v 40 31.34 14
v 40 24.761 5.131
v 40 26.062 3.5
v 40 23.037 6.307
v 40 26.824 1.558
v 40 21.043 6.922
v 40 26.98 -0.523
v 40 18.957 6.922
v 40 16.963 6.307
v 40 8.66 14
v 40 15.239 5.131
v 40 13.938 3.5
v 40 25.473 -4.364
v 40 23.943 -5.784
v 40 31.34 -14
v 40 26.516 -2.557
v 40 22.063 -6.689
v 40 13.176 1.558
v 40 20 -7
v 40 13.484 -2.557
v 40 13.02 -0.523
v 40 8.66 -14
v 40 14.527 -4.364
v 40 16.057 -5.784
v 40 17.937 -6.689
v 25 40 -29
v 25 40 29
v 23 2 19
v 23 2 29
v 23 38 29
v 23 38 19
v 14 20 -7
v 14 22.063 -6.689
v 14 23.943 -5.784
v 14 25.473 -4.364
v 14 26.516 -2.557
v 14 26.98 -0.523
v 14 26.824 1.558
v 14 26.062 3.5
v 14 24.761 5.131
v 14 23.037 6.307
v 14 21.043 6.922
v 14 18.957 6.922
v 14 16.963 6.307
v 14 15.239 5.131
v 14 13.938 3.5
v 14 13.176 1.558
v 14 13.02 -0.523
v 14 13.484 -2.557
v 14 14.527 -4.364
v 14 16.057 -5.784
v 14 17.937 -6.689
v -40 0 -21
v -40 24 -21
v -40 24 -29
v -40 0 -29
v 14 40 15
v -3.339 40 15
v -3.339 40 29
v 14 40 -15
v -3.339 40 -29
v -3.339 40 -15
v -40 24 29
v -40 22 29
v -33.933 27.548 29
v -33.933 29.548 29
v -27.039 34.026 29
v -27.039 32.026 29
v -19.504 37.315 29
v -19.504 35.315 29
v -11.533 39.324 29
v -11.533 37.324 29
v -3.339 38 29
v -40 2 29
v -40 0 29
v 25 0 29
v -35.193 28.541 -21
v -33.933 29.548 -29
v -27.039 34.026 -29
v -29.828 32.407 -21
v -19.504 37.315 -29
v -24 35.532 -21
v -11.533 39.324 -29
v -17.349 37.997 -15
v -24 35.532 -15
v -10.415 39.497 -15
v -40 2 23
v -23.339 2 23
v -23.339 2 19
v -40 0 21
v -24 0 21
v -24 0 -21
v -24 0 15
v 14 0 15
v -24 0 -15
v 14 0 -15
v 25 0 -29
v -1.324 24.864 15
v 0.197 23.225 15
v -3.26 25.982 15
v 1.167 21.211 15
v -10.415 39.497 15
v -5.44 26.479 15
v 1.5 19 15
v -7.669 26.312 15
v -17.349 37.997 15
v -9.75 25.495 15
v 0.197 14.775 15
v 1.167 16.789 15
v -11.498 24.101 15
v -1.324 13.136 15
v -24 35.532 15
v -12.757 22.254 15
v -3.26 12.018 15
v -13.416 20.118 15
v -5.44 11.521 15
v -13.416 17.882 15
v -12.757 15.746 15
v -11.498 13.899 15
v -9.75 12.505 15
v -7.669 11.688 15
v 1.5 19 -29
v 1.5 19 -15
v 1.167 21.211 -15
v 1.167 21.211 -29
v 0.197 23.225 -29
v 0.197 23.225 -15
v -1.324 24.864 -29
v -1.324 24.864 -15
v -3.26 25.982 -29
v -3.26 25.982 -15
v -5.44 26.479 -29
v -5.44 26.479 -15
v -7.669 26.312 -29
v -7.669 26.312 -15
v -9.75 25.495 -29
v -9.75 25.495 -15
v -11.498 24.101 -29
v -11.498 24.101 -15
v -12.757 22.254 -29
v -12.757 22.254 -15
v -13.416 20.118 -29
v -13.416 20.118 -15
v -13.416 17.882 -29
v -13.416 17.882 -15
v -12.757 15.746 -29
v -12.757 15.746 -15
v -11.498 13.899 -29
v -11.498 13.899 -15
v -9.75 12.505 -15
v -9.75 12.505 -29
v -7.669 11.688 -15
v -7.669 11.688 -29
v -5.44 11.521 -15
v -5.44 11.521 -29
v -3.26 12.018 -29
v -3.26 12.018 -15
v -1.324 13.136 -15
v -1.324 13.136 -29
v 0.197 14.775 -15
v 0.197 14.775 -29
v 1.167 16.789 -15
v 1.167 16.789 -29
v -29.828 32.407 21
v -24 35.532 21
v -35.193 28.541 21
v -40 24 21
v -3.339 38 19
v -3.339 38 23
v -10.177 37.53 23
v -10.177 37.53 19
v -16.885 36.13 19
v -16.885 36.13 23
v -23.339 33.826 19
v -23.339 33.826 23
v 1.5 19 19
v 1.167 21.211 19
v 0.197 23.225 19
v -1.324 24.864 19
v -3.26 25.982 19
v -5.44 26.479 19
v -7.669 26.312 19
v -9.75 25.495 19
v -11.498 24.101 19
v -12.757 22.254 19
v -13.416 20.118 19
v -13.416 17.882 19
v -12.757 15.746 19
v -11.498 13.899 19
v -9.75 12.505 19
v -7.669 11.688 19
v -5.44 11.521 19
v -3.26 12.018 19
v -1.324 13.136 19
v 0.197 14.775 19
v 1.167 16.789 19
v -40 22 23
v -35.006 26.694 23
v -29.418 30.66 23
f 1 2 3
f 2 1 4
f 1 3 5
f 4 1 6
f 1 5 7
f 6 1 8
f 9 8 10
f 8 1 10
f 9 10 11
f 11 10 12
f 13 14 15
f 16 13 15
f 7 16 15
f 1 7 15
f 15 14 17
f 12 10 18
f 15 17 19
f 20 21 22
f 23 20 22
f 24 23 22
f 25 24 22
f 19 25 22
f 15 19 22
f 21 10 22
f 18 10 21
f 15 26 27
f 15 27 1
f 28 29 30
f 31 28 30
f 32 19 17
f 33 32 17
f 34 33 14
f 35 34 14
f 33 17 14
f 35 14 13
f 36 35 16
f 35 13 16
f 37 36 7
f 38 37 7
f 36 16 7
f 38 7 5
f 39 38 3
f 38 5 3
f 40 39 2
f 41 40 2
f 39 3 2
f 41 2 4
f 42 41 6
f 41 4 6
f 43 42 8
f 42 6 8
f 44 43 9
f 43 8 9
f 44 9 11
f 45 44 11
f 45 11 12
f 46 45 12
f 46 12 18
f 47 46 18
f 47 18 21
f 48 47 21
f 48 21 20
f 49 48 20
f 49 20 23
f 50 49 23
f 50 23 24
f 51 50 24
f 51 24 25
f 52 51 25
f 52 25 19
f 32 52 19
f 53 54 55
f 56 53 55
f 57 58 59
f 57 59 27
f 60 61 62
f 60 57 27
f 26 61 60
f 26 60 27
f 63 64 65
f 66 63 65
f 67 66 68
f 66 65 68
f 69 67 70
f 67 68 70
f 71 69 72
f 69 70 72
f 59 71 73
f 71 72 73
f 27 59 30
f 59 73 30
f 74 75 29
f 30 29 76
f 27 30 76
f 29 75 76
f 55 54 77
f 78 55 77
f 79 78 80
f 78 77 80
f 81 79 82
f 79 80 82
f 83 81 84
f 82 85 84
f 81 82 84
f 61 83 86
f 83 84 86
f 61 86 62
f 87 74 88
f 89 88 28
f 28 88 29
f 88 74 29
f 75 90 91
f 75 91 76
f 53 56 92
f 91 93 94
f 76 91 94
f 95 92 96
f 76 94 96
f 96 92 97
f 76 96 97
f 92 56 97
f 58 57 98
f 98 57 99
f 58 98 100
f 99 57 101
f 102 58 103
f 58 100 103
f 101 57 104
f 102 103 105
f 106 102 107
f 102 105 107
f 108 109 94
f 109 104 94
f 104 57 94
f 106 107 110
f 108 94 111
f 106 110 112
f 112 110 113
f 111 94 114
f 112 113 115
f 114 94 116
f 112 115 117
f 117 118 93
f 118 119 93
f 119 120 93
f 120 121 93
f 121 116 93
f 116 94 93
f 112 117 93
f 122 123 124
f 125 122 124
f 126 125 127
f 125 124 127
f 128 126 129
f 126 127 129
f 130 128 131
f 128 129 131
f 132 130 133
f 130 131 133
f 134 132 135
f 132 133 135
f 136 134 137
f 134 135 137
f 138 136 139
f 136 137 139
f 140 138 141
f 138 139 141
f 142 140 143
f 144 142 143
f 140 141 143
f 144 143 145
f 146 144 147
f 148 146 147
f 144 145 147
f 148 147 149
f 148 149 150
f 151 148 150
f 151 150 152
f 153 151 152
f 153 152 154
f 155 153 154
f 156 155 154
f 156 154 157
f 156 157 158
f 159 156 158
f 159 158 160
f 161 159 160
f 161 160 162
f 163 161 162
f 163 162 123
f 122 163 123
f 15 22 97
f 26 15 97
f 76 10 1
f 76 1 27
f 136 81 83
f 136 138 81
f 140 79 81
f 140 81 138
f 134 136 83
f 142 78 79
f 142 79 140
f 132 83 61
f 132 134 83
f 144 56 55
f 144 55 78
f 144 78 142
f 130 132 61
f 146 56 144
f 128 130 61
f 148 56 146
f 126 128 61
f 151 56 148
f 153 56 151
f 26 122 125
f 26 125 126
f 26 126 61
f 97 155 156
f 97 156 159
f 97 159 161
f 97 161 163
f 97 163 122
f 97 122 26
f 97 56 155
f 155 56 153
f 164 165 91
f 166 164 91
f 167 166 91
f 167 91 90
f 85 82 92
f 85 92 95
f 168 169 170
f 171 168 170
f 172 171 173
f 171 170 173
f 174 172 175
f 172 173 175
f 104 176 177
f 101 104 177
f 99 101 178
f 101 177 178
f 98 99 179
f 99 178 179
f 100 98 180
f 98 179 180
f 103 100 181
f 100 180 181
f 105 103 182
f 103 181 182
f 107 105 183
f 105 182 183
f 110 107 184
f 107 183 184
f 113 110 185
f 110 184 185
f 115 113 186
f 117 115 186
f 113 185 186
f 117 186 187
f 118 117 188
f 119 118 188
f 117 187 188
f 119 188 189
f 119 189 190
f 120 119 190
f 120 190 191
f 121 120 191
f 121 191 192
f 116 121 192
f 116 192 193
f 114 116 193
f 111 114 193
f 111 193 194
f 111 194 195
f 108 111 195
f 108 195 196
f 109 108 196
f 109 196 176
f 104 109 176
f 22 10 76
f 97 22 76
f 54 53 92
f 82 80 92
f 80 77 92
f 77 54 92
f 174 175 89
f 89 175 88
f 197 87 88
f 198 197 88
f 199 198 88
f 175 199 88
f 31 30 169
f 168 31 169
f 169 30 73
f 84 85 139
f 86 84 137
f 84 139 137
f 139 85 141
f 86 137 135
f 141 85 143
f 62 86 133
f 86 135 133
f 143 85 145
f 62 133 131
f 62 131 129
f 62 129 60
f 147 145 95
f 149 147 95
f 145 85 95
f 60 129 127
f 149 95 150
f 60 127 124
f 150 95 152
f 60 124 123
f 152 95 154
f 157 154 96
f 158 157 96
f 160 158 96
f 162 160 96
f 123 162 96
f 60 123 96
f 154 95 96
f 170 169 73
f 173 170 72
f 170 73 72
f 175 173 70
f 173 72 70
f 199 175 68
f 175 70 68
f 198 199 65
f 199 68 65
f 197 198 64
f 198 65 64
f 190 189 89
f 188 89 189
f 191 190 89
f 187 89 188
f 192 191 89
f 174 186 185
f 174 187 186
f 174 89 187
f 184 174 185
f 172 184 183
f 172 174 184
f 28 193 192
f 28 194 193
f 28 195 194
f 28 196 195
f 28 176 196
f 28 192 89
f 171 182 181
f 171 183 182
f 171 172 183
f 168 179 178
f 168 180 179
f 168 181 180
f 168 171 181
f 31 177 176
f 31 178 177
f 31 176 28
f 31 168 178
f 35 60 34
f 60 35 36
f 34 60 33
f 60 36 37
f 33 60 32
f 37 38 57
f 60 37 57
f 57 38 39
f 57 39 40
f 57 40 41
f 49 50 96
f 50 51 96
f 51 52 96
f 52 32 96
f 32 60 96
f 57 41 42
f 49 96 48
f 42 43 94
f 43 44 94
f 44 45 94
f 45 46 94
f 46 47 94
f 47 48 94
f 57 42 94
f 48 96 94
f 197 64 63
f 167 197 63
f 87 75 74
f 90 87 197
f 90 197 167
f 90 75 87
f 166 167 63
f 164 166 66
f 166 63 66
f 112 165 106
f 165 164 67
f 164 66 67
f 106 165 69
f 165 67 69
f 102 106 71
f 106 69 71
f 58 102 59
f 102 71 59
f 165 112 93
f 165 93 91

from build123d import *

# Parameters (mm, degrees)
SKETCH1_W           = 80
SKETCH1_H           = 58
BOSS_EXTRUDE1_DEPTH = 40
SKETCH2_R           = 7.5
CUT_EXTRUDE1_DEPTH  = 82.018516402
CUT_EXTRUDE6_DEPTH  = 64.568860301
SKETCH4_R           = 7
CUT_EXTRUDE7_DEPTH  = 95.026591983
CUT_EXTRUDE8_DEPTH  = 6
CUT_EXTRUDE9_DEPTH  = 4


with BuildPart() as part:
    # Sketch1 → Boss-Extrude1 (new body)
    with BuildSketch(Plane(origin=(0, 0, 0), x_dir=(1, 0, 0), z_dir=(0, 1, 0))):
        Rectangle(SKETCH1_W, SKETCH1_H)
    extrude(amount=BOSS_EXTRUDE1_DEPTH)

    # Sketch2 → Cut-Extrude1 (cut, through all)
    with BuildSketch(Plane.XY.offset(29)):
        Polygon((40, 40), (25, 40), (40, 31.339745962), align=None)
        with BuildLine():
            ThreePointArc((-40, 24), (-23.33939444, 35.82575695), (-3.33939444, 40))
            Line((-3.33939444, 40), (-40, 40))
            Line((-40, 40), (-40, 24))
        make_face()
        Polygon((40, 0), (40, 8.660254038), (25, 0), align=None)
        with Locations((-6, 19)):
            Circle(SKETCH2_R)
    extrude(amount=-CUT_EXTRUDE1_DEPTH, mode=Mode.SUBTRACT)

    # Sketch3 → Cut-Extrude6 (cut, through all)
    with BuildSketch(Plane(origin=(0, 0, 0), x_dir=(1, 0, 0), z_dir=(0, 1, 0))):
        Polygon((25, 29), (40, 29), (40, 14), align=None)
        Polygon((40, -14), (25, -29), (40, -29), align=None)
        Polygon((-40, 21), (-24, 21), (-24, 15), (14, 15), (14, -15), (-24, -15), (-24, -21), (-40, -21), align=None)
    extrude(amount=CUT_EXTRUDE6_DEPTH, mode=Mode.SUBTRACT)

    # Sketch4 → Cut-Extrude7 (cut, through all)
    with BuildSketch(Plane(origin=(40, 0, 0), x_dir=(0, 0, -1), z_dir=(1, 0, 0))):
        with Locations((0, 20)):
            Circle(SKETCH4_R)
    extrude(amount=-CUT_EXTRUDE7_DEPTH, mode=Mode.SUBTRACT)

    # Sketch5 → Cut-Extrude8 (cut)
    with BuildSketch(Plane.XY.offset(29)):
        with BuildLine():
            Line((-40, 2), (23, 2))
            Line((23, 2), (23, 38))
            Line((23, 38), (-3.33939444, 38))
            ThreePointArc((-3.33939444, 38), (-23.33939444, 33.82575695), (-40, 22))
            Line((-40, 22), (-40, 2))
        make_face()
    extrude(amount=-CUT_EXTRUDE8_DEPTH, mode=Mode.SUBTRACT)

    # Sketch6 → Cut-Extrude9 (cut)
    with BuildSketch(Plane.XY.offset(23)):
        with BuildLine():
            Line((-23.33939444, 33.82575695), (-23.33939444, 2))
            Line((-23.33939444, 2), (23, 2))
            Line((23, 2), (23, 38))
            Line((23, 38), (-3.33939444, 38))
            ThreePointArc((-3.33939444, 38), (-13.554876625, 36.945315647), (-23.33939444, 33.82575695))
        make_face()
    extrude(amount=-CUT_EXTRUDE9_DEPTH, mode=Mode.SUBTRACT)


solid = part.part
